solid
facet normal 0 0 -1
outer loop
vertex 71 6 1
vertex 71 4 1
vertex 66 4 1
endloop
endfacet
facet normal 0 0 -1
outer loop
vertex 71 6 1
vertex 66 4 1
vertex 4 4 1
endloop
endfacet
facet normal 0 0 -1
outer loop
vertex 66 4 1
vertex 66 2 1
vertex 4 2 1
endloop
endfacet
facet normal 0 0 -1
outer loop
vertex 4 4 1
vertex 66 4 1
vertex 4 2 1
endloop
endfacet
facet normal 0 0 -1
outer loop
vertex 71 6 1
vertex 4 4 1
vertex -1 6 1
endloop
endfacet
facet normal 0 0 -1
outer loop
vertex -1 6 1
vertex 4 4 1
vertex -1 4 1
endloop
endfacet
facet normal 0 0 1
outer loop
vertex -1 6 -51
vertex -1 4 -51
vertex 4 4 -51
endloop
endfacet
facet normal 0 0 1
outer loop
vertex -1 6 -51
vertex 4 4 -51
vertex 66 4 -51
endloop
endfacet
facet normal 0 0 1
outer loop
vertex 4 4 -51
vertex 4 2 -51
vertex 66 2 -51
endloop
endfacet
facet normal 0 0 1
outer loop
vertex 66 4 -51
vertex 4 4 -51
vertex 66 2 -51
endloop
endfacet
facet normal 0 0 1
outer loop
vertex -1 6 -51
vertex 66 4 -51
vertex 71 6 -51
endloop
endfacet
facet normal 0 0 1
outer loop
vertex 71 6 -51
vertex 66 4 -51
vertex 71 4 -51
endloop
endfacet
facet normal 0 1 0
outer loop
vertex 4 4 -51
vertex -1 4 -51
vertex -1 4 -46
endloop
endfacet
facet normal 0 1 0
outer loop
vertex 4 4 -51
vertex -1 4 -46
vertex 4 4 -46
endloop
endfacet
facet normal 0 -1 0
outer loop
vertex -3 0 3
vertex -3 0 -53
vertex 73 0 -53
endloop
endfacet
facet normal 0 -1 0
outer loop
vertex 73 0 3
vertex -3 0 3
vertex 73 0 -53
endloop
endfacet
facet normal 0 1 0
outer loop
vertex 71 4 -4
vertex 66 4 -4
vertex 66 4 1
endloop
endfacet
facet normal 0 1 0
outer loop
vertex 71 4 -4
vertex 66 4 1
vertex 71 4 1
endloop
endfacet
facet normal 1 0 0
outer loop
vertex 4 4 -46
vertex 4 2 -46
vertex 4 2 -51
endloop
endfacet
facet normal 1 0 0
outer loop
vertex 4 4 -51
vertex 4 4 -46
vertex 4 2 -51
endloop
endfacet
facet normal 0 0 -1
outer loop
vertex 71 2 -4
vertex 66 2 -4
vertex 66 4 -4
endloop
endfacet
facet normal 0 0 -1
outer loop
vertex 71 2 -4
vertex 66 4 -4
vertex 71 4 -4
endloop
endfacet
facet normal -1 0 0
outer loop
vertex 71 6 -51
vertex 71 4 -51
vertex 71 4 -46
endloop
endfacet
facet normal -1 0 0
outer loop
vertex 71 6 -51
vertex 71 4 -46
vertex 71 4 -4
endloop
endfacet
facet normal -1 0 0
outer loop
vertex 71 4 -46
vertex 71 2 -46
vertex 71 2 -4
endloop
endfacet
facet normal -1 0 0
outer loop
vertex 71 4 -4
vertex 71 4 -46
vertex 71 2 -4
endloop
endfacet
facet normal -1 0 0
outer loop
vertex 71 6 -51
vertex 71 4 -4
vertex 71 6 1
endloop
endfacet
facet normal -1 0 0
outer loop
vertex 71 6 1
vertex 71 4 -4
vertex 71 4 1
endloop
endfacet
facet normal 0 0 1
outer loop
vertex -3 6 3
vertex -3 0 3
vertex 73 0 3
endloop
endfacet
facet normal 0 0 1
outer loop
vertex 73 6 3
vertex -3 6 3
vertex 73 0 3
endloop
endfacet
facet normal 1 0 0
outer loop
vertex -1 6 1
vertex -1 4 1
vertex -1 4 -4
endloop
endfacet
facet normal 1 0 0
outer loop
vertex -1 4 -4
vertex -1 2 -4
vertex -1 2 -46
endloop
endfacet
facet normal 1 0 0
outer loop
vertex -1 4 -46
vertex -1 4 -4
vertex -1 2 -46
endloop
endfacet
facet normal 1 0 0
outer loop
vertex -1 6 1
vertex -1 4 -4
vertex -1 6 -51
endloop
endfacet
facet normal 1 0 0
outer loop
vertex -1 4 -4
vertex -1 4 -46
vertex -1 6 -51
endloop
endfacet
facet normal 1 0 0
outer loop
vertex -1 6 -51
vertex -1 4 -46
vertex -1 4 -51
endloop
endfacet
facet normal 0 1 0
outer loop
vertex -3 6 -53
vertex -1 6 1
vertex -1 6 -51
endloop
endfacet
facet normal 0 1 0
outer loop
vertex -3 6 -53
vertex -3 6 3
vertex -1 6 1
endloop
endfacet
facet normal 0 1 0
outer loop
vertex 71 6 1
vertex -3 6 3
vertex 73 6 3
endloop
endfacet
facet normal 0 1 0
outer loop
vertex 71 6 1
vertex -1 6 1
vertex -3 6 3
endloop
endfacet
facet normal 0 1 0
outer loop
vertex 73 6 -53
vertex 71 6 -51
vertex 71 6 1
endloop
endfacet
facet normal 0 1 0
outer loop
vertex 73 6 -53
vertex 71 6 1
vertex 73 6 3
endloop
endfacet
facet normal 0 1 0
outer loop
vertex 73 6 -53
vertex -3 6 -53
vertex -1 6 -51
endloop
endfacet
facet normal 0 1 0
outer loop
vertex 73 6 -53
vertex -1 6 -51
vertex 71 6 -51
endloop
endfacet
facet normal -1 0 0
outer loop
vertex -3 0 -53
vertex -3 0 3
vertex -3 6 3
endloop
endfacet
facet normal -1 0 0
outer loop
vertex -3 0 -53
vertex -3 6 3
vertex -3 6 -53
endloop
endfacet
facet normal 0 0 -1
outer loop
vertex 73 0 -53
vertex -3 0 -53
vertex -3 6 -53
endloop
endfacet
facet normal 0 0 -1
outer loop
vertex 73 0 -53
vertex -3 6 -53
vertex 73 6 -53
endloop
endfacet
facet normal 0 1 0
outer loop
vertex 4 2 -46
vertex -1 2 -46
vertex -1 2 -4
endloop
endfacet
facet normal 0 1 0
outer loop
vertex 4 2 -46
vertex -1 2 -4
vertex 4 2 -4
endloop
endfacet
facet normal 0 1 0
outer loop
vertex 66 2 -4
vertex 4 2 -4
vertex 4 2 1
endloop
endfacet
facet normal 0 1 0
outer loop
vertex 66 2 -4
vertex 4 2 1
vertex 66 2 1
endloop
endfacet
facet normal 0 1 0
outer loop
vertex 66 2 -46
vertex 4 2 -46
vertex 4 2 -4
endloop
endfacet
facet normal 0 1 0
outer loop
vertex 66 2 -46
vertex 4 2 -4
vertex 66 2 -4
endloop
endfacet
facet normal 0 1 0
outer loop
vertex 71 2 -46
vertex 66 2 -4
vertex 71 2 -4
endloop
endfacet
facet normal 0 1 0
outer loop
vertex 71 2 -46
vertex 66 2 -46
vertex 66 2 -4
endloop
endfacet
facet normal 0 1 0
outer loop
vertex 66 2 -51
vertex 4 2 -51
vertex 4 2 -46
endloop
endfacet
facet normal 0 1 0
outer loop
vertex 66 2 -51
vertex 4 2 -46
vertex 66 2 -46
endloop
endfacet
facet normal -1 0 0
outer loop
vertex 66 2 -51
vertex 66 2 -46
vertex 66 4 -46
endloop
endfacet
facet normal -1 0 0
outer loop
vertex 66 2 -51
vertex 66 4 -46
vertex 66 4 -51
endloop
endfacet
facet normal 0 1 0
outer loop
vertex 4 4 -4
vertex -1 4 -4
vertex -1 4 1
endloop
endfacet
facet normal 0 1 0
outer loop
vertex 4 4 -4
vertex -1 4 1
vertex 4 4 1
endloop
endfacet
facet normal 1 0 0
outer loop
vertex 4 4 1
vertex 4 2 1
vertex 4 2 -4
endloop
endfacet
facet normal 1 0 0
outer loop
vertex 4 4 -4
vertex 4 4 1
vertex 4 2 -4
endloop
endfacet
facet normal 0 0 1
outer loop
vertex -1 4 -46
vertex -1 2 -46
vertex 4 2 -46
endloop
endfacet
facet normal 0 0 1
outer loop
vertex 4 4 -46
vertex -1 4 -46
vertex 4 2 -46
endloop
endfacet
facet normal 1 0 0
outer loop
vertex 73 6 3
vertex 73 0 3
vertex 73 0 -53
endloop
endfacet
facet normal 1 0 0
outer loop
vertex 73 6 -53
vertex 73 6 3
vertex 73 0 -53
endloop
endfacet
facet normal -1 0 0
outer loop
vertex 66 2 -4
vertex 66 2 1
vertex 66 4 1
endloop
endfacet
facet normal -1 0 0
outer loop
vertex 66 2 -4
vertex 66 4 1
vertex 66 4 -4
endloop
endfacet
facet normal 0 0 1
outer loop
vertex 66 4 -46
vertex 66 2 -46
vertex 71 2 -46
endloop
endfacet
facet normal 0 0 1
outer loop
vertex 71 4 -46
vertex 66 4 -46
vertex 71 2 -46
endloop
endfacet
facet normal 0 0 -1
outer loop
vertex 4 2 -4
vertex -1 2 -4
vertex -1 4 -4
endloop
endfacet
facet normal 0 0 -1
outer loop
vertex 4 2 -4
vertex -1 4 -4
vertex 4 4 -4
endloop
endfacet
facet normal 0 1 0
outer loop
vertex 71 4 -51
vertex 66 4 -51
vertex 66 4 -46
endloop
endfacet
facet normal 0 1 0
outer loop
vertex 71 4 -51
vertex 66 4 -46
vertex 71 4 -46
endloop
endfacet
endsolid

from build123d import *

# Parameters (mm, degrees)
SKETCH1_W           = 76
SKETCH1_H           = 56
BOSS_EXTRUDE1_DEPTH = 2
SKETCH1_4_W         = 5
SKETCH1_4_H         = 5
BOSS_EXTRUDE2_DEPTH = 4
SKETCH1_5_W         = 76
SKETCH1_5_H         = 56
SKETCH1_5_W_2       = 72
SKETCH1_5_H_2       = 52
BOSS_EXTRUDE3_DEPTH = 6


with BuildPart() as part:
    # Sketch1 → Boss-Extrude1 (new body)
    with BuildSketch(Plane(origin=(0, 0, 0), x_dir=(1, 0, 0), z_dir=(0, 1, 0))):
        with Locations((35, 25)):
            Rectangle(SKETCH1_W, SKETCH1_H)
    extrude(amount=BOSS_EXTRUDE1_DEPTH)

    # Sketch1<4> → Boss-Extrude2 (add)
    with BuildSketch(Plane(origin=(0, 0, 0), x_dir=(1, 0, 0), z_dir=(0, 1, 0))):
        with Locations((1.5, 48.5)):
            Rectangle(SKETCH1_4_W, SKETCH1_4_H)
        with Locations((68.5, 48.5)):
            Rectangle(SKETCH1_4_W, SKETCH1_4_H)
        with Locations((1.5, 1.5)):
            Rectangle(SKETCH1_4_W, SKETCH1_4_H)
        with Locations((68.5, 1.5)):
            Rectangle(SKETCH1_4_W, SKETCH1_4_H)
    extrude(amount=BOSS_EXTRUDE2_DEPTH)

    # Sketch1<5> → Boss-Extrude3 (add)
    with BuildSketch(Plane(origin=(0, 0, 0), x_dir=(1, 0, 0), z_dir=(0, 1, 0))):
        with Locations((35, 25)):
            Rectangle(SKETCH1_5_W, SKETCH1_5_H)
        with Locations((35, 25)):
            Rectangle(SKETCH1_5_W_2, SKETCH1_5_H_2, mode=Mode.SUBTRACT)
    extrude(amount=BOSS_EXTRUDE3_DEPTH)


solid = part.part
